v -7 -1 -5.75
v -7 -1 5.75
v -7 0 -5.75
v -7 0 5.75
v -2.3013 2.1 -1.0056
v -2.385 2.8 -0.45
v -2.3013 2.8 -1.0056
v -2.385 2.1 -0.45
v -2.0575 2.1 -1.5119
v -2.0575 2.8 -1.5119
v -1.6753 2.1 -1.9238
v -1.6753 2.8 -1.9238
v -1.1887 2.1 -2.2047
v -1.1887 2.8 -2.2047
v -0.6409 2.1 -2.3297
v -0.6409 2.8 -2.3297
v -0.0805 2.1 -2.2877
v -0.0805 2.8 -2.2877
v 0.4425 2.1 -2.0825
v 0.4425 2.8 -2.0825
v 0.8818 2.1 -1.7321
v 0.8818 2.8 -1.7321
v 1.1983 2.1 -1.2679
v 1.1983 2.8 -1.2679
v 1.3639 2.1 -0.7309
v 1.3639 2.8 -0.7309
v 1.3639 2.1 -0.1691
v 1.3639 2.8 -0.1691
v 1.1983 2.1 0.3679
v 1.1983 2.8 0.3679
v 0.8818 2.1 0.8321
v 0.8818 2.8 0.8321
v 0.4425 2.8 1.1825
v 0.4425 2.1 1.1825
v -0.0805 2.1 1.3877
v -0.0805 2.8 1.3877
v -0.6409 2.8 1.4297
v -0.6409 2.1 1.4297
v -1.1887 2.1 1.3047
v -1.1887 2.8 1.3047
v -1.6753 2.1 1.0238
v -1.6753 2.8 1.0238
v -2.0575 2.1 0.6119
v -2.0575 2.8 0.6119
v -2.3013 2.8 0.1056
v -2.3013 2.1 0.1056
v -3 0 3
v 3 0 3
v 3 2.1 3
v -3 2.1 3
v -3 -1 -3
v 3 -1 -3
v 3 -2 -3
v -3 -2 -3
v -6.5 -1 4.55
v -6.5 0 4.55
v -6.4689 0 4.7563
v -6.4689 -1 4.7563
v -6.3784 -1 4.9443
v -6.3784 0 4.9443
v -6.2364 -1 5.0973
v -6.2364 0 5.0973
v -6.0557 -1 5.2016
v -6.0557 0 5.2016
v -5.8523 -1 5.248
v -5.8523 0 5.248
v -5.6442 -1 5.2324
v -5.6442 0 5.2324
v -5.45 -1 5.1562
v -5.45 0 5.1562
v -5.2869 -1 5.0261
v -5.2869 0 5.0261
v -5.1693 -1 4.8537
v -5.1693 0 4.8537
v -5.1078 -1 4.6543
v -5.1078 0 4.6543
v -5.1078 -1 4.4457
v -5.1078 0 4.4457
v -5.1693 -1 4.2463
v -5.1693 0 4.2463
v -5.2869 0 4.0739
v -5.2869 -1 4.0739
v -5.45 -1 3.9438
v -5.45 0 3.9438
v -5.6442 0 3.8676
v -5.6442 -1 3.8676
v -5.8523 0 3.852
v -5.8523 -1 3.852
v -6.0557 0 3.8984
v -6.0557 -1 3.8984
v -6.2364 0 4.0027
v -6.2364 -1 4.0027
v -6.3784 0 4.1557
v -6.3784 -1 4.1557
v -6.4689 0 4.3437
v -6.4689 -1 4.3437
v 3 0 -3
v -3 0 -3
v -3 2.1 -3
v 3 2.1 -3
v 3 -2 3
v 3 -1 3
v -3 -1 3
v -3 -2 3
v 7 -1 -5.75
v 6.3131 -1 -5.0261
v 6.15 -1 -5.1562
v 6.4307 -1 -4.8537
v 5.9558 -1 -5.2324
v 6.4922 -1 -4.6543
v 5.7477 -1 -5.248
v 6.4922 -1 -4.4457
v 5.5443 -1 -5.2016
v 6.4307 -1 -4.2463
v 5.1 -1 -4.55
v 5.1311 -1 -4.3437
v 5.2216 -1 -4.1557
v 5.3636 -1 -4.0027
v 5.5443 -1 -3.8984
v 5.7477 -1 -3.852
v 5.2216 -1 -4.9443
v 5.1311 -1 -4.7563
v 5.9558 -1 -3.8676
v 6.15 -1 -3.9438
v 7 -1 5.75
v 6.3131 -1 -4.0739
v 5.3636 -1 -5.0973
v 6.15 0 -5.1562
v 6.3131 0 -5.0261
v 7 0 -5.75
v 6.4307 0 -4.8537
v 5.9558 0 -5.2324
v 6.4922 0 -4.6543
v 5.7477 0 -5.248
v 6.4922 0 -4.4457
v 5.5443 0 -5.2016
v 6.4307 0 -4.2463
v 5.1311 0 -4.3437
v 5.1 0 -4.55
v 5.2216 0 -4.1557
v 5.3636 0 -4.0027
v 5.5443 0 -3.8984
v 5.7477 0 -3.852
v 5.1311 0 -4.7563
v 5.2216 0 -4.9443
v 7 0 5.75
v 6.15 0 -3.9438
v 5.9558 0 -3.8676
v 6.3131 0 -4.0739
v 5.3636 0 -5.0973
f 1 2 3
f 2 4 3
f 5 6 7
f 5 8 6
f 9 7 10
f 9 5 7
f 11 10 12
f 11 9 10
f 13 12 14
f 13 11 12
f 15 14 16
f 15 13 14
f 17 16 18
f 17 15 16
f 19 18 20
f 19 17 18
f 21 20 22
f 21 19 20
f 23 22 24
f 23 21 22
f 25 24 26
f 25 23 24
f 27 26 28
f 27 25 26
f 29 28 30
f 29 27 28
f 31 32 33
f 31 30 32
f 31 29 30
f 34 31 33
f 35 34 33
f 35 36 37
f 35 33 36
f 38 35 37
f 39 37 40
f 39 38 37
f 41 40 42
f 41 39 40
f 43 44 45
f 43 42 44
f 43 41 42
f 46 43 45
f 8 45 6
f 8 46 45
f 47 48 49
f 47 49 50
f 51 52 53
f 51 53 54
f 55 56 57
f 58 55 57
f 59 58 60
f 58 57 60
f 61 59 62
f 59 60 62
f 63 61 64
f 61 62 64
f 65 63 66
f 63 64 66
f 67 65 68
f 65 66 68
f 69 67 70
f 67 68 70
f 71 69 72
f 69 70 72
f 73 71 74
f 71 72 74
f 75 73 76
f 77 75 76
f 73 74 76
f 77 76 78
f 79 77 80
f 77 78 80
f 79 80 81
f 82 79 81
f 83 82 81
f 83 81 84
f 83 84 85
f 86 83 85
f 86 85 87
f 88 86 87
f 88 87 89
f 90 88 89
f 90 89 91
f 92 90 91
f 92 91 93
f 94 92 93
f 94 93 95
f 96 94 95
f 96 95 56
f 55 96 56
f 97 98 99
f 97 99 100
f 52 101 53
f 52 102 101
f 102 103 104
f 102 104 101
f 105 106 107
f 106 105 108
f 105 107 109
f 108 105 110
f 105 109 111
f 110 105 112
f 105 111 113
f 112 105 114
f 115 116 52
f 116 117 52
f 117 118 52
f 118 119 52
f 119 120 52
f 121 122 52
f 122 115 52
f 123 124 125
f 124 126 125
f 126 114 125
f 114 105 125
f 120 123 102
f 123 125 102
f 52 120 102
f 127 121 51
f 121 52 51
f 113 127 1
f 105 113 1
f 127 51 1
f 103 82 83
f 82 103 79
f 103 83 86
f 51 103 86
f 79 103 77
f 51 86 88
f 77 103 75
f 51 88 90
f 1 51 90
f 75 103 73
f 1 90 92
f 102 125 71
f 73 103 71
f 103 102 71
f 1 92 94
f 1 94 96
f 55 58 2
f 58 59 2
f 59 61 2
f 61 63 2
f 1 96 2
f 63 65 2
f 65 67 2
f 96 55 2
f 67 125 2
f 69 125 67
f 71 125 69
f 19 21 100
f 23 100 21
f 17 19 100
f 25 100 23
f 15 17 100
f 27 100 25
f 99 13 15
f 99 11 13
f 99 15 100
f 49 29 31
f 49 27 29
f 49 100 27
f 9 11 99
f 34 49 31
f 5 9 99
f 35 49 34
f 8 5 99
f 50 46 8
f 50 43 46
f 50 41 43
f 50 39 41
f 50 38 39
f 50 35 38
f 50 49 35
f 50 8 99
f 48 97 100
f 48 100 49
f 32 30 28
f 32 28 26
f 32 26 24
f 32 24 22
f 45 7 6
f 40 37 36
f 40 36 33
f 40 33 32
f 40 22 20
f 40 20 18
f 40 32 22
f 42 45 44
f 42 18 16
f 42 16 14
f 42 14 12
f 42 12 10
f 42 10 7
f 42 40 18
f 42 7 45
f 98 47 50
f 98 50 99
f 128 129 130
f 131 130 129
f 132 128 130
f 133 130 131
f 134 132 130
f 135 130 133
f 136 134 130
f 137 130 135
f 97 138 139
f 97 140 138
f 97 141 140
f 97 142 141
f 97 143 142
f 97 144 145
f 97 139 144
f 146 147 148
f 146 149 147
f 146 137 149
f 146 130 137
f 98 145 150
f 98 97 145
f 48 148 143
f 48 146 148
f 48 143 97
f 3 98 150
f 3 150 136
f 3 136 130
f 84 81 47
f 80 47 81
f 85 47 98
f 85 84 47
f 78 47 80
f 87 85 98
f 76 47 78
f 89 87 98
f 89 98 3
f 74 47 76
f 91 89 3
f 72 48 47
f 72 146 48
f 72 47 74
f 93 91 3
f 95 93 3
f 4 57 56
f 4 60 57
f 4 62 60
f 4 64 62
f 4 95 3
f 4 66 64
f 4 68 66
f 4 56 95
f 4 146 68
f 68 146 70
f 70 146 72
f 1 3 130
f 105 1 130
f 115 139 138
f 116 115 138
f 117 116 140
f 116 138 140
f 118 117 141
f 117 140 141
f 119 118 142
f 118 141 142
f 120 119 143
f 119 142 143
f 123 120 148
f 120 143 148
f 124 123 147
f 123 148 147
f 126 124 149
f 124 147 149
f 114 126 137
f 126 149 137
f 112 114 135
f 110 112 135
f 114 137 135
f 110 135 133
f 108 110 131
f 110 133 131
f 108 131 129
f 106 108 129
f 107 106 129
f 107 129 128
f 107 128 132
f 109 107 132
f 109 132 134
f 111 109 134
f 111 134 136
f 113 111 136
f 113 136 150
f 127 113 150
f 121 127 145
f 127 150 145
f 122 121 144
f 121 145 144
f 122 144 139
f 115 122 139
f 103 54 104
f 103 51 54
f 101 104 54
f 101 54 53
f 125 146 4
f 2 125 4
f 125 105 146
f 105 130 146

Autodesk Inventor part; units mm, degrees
ref_plane "YZ Plane" through (0, 0, 0) normal (1, 0, 0) x (0, 1, 0)
ref_plane "XZ Plane" through (0, 0, 0) normal (0, 1, 0) x (-1, 0, 0)
ref_plane "XY Plane" through (0, 0, 0) normal (0, 0, 1) x (1, 0, 0)
sketch "Sketch1" plane through (0, 0, 0) normal (0, 1, 0) x (-1, 0, 0)
  line L0 (-7, 5.75) -> (7, 5.75)
  line L1 (7, 5.75) -> (7, -5.75)
  line L2 (7, -5.75) -> (-7, -5.75)
  line L3 (-7, -5.75) -> (-7, 5.75)
  line L4 (7, 5.75) -> (-7, -5.75) construction
  line L5 (-7, -5.75) -> (-5.8, -5.75)
  line L6 (-7, -4.55) -> (-7, -5.75)
  line L7 (7, 5.75) -> (5.8, 5.75)
  line L8 (7, 4.55) -> (7, 5.75)
  circle A0 centre (-5.8, -4.55) radius 0.7
  circle A1 centre (5.8, 4.55) radius 0.7
  line L9 (-3, 3) -> (3, 3)
  line L10 (3, 3) -> (3, -3)
  line L11 (3, -3) -> (-3, -3)
  line L12 (-3, -3) -> (-3, 3)
  line L13 (-3, 3) -> (3, -3) construction
  line L14 (3, 3) -> (-3, -3) construction
  circle A2 centre (0.5, -0.45) radius 1.885
  point P0 (3.3, -2.75)
  point P1 (0, 0)
  dimension "d0" = 14
  dimension "d1" = 11.5
  dimension "d6" = 1.4
  dimension "d7" = 1.4
  dimension "d12" = 6
  dimension "d13" = 6
  dimension "d17" = 3.77
sketch "Sketch2" plane through (0, 0, 0) normal (0, 1, 0) x (-1, 0, 0)
  line L0 (-7, 5.75) -> (7, 5.75)
  line L1 (7, 5.75) -> (7, -5.75)
  line L2 (7, -5.75) -> (-7, -5.75)
  line L3 (-7, -5.75) -> (-7, 5.75)
  line L4 (7, 5.75) -> (-7, -5.75) construction
  line L5 (-7, -5.75) -> (-5.8, -5.75)
  line L6 (-7, -4.55) -> (-7, -5.75)
  line L7 (7, 5.75) -> (5.8, 5.75)
  line L8 (7, 4.55) -> (7, 5.75)
  circle A0 centre (-5.8, -4.55) radius 0.7
  circle A1 centre (5.8, 4.55) radius 0.7
  line L9 (-3, 3) -> (3, 3)
  line L10 (3, 3) -> (3, -3)
  line L11 (3, -3) -> (-3, -3)
  line L12 (-3, -3) -> (-3, 3)
  line L13 (-3, 3) -> (3, -3) construction
  line L14 (3, 3) -> (-3, -3) construction
  circle A2 centre (0.5, -0.45) radius 1.885
  point P0 (0, 0)
  point P1 (3.3, -2.75)
  point P2 (0, 0)
  dimension "d18" = 14
  dimension "d19" = 11.5
  dimension "d20" = 1.4
  dimension "d21" = 1.4
  dimension "d22" = 6
  dimension "d23" = 6
  dimension "d24" = 3.77
sketch "Sketch3" plane through (0, 0, 0) normal (0, 1, 0) x (-1, 0, 0)
  line L0 (-7, 5.75) -> (7, 5.75)
  line L1 (7, 5.75) -> (7, -5.75)
  line L2 (7, -5.75) -> (-7, -5.75)
  line L3 (-7, -5.75) -> (-7, 5.75)
  line L4 (7, 5.75) -> (-7, -5.75) construction
  line L5 (-7, -5.75) -> (-5.8, -5.75)
  line L6 (-7, -4.55) -> (-7, -5.75)
  line L7 (7, 5.75) -> (5.8, 5.75)
  line L8 (7, 4.55) -> (7, 5.75)
  circle A0 centre (-5.8, -4.55) radius 0.7
  circle A1 centre (5.8, 4.55) radius 0.7
  line L9 (-3, 3) -> (3, 3)
  line L10 (3, 3) -> (3, -3)
  line L11 (3, -3) -> (-3, -3)
  line L12 (-3, -3) -> (-3, 3)
  line L13 (-3, 3) -> (3, -3) construction
  line L14 (3, 3) -> (-3, -3) construction
  circle A2 centre (0.5, -0.45) radius 1.885
  point P0 (0, 0)
  point P1 (3.3, -2.75)
  point P2 (0, 0)
  dimension "d25" = 14
  dimension "d26" = 11.5
  dimension "d27" = 1.4
  dimension "d28" = 1.4
  dimension "d29" = 6
  dimension "d30" = 6
  dimension "d31" = 3.77
extrude "Extrusion1" add sketch "Sketch1" against normal blind 1 contours L0 L1 L2 L3 | L9 L10 L11 L12 | A2
extrude "Extrusion2" add sketch "Sketch2" along normal blind 2.1 contours L9 L10 L11 L12 | A2
extrude "Extrusion3" add sketch "Sketch3" along normal blind 0.7 from surface at 2.1 contours A2
sketch "Sketch4" plane through (0, -1, 0) normal (0, -1, 0) x (1, 0, 0)
  line L0 (3, -3) -> (-3, -3)
  line L1 (-3, -3) -> (-3, 3)
  line L2 (-3, 3) -> (3, 3)
  line L3 (3, 3) -> (3, -3)
  line L4 (3, -3) -> (-3, 3) construction
  line L5 (-3, -3) -> (3, 3) construction
  point P0 (0, 0)
  dimension "d38" = 6
  dimension "d39" = 6
extrude "Extrusion4" add sketch "Sketch4" along normal blind 1
properties part number "optical"
